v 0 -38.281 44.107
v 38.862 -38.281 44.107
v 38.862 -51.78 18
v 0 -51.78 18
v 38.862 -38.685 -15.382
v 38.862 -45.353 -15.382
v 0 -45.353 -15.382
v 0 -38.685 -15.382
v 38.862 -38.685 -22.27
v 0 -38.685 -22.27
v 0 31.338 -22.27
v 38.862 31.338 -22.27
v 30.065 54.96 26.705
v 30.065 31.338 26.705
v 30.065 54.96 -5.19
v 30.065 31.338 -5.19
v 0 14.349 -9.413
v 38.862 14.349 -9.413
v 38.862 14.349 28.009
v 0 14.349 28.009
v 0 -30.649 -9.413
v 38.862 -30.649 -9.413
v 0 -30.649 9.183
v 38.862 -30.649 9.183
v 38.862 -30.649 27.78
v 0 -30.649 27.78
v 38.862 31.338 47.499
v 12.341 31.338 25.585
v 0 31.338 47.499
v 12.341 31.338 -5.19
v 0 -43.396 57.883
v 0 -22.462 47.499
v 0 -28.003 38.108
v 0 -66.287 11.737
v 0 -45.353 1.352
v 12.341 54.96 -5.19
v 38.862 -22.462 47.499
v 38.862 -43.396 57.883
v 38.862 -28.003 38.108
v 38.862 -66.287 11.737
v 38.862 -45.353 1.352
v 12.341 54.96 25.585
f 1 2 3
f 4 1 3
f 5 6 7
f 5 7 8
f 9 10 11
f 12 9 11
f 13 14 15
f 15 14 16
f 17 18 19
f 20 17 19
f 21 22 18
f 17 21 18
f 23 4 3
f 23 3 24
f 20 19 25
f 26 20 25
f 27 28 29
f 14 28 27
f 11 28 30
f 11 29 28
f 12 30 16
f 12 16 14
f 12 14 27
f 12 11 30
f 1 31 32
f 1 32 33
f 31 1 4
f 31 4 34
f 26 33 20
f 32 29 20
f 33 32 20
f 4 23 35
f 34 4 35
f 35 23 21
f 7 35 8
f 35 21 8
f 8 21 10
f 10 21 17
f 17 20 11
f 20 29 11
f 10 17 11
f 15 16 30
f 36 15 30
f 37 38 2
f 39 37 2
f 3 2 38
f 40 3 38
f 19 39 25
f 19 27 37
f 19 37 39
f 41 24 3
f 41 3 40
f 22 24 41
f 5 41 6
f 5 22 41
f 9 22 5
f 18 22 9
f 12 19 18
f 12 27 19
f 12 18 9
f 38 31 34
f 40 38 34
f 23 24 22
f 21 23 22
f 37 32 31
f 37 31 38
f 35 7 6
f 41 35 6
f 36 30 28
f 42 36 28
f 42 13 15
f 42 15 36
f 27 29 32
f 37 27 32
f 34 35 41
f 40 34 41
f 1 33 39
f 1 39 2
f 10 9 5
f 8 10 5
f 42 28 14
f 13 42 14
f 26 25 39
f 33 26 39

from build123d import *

# Parameters (mm, degrees)
F1_DEPTH  = 38.862
F2_DEPTH  = 23.622
F3_DEPTH  = 23.368
F5_DEPTH  = 79.248
F7_DEPTH  = 75.692
F8_W      = 6.6682146308
F8_H      = 6.8875169381
F9_DEPTH  = 99.314
F11_DEPTH = 23.622


with BuildPart() as f1:
    # F0 (on Right) → F1 (new body)
    with BuildSketch(Plane.YZ):
        Polygon((31.3382074237, 23.87672849), (-22.4620722006, 23.87672849), (-45.3531080303, -22.2696410492), (31.3382074237, -22.2696410492), align=None)
    extrude(amount=F1_DEPTH)

    # F2 (add): faces of the model
    f2_faces = [f1.faces().sort_by_distance(p)[0] for p in [
        (19.431, 4.4380676116, 23.87672849),
        (19.431, -33.9075901154, 0.8035437204),
    ]]
    extrude(f2_faces, amount=F2_DEPTH, dir=(0, 0, 1))

    # F3 (add): a face of the model
    f3_faces = [f1.faces().sort_by_distance(p)[0] for p in [
        (19.431, -33.9075901154, 24.4255437204),
    ]]
    extrude(f3_faces, amount=F3_DEPTH)

    # F4 (on face) → F5 (cut)
    with BuildSketch(Plane.YZ.offset(38.862)):
        Polygon((14.3489968032, 28.0092395842), (-30.6494552642, 27.779655531), (-30.6494552642, -9.4129415229), (14.3489968032, -9.4129415229), align=None)
    extrude(amount=-F5_DEPTH, mode=Mode.SUBTRACT)

    # F6 (on face) → F7 (cut)
    with BuildSketch(Plane.YZ.offset(38.862)):
        Polygon((-28.0031748116, 38.1083898246), (-38.2806286216, 44.1071428359), (-51.7797023058, 17.9995857179), (-30.6494552642, 9.1833570041), (-30.6494552642, 27.779655531), align=None)
    extrude(amount=-F7_DEPTH, mode=Mode.SUBTRACT)

    # F8 (on face) → F9 (cut)
    with BuildSketch(Plane.YZ.offset(38.862)):
        with Locations((-42.0190007149, -18.8258825801)):
            Rectangle(F8_W, F8_H)
    extrude(amount=-F9_DEPTH, mode=Mode.SUBTRACT)

    # F10 (on face) → F11 (join)
    with BuildSketch(Plane(origin=(0, 31.3382074237, 0), x_dir=(-1, 0, 0), z_dir=(0, 1, 0))):
        Polygon((-12.3405372724, 25.5852285773), (-30.064733699, 26.704614982), (-30.064733699, -5.189940799), (-12.3405372724, -5.189940799), align=None)
    extrude(amount=F11_DEPTH)


solid = f1.part
